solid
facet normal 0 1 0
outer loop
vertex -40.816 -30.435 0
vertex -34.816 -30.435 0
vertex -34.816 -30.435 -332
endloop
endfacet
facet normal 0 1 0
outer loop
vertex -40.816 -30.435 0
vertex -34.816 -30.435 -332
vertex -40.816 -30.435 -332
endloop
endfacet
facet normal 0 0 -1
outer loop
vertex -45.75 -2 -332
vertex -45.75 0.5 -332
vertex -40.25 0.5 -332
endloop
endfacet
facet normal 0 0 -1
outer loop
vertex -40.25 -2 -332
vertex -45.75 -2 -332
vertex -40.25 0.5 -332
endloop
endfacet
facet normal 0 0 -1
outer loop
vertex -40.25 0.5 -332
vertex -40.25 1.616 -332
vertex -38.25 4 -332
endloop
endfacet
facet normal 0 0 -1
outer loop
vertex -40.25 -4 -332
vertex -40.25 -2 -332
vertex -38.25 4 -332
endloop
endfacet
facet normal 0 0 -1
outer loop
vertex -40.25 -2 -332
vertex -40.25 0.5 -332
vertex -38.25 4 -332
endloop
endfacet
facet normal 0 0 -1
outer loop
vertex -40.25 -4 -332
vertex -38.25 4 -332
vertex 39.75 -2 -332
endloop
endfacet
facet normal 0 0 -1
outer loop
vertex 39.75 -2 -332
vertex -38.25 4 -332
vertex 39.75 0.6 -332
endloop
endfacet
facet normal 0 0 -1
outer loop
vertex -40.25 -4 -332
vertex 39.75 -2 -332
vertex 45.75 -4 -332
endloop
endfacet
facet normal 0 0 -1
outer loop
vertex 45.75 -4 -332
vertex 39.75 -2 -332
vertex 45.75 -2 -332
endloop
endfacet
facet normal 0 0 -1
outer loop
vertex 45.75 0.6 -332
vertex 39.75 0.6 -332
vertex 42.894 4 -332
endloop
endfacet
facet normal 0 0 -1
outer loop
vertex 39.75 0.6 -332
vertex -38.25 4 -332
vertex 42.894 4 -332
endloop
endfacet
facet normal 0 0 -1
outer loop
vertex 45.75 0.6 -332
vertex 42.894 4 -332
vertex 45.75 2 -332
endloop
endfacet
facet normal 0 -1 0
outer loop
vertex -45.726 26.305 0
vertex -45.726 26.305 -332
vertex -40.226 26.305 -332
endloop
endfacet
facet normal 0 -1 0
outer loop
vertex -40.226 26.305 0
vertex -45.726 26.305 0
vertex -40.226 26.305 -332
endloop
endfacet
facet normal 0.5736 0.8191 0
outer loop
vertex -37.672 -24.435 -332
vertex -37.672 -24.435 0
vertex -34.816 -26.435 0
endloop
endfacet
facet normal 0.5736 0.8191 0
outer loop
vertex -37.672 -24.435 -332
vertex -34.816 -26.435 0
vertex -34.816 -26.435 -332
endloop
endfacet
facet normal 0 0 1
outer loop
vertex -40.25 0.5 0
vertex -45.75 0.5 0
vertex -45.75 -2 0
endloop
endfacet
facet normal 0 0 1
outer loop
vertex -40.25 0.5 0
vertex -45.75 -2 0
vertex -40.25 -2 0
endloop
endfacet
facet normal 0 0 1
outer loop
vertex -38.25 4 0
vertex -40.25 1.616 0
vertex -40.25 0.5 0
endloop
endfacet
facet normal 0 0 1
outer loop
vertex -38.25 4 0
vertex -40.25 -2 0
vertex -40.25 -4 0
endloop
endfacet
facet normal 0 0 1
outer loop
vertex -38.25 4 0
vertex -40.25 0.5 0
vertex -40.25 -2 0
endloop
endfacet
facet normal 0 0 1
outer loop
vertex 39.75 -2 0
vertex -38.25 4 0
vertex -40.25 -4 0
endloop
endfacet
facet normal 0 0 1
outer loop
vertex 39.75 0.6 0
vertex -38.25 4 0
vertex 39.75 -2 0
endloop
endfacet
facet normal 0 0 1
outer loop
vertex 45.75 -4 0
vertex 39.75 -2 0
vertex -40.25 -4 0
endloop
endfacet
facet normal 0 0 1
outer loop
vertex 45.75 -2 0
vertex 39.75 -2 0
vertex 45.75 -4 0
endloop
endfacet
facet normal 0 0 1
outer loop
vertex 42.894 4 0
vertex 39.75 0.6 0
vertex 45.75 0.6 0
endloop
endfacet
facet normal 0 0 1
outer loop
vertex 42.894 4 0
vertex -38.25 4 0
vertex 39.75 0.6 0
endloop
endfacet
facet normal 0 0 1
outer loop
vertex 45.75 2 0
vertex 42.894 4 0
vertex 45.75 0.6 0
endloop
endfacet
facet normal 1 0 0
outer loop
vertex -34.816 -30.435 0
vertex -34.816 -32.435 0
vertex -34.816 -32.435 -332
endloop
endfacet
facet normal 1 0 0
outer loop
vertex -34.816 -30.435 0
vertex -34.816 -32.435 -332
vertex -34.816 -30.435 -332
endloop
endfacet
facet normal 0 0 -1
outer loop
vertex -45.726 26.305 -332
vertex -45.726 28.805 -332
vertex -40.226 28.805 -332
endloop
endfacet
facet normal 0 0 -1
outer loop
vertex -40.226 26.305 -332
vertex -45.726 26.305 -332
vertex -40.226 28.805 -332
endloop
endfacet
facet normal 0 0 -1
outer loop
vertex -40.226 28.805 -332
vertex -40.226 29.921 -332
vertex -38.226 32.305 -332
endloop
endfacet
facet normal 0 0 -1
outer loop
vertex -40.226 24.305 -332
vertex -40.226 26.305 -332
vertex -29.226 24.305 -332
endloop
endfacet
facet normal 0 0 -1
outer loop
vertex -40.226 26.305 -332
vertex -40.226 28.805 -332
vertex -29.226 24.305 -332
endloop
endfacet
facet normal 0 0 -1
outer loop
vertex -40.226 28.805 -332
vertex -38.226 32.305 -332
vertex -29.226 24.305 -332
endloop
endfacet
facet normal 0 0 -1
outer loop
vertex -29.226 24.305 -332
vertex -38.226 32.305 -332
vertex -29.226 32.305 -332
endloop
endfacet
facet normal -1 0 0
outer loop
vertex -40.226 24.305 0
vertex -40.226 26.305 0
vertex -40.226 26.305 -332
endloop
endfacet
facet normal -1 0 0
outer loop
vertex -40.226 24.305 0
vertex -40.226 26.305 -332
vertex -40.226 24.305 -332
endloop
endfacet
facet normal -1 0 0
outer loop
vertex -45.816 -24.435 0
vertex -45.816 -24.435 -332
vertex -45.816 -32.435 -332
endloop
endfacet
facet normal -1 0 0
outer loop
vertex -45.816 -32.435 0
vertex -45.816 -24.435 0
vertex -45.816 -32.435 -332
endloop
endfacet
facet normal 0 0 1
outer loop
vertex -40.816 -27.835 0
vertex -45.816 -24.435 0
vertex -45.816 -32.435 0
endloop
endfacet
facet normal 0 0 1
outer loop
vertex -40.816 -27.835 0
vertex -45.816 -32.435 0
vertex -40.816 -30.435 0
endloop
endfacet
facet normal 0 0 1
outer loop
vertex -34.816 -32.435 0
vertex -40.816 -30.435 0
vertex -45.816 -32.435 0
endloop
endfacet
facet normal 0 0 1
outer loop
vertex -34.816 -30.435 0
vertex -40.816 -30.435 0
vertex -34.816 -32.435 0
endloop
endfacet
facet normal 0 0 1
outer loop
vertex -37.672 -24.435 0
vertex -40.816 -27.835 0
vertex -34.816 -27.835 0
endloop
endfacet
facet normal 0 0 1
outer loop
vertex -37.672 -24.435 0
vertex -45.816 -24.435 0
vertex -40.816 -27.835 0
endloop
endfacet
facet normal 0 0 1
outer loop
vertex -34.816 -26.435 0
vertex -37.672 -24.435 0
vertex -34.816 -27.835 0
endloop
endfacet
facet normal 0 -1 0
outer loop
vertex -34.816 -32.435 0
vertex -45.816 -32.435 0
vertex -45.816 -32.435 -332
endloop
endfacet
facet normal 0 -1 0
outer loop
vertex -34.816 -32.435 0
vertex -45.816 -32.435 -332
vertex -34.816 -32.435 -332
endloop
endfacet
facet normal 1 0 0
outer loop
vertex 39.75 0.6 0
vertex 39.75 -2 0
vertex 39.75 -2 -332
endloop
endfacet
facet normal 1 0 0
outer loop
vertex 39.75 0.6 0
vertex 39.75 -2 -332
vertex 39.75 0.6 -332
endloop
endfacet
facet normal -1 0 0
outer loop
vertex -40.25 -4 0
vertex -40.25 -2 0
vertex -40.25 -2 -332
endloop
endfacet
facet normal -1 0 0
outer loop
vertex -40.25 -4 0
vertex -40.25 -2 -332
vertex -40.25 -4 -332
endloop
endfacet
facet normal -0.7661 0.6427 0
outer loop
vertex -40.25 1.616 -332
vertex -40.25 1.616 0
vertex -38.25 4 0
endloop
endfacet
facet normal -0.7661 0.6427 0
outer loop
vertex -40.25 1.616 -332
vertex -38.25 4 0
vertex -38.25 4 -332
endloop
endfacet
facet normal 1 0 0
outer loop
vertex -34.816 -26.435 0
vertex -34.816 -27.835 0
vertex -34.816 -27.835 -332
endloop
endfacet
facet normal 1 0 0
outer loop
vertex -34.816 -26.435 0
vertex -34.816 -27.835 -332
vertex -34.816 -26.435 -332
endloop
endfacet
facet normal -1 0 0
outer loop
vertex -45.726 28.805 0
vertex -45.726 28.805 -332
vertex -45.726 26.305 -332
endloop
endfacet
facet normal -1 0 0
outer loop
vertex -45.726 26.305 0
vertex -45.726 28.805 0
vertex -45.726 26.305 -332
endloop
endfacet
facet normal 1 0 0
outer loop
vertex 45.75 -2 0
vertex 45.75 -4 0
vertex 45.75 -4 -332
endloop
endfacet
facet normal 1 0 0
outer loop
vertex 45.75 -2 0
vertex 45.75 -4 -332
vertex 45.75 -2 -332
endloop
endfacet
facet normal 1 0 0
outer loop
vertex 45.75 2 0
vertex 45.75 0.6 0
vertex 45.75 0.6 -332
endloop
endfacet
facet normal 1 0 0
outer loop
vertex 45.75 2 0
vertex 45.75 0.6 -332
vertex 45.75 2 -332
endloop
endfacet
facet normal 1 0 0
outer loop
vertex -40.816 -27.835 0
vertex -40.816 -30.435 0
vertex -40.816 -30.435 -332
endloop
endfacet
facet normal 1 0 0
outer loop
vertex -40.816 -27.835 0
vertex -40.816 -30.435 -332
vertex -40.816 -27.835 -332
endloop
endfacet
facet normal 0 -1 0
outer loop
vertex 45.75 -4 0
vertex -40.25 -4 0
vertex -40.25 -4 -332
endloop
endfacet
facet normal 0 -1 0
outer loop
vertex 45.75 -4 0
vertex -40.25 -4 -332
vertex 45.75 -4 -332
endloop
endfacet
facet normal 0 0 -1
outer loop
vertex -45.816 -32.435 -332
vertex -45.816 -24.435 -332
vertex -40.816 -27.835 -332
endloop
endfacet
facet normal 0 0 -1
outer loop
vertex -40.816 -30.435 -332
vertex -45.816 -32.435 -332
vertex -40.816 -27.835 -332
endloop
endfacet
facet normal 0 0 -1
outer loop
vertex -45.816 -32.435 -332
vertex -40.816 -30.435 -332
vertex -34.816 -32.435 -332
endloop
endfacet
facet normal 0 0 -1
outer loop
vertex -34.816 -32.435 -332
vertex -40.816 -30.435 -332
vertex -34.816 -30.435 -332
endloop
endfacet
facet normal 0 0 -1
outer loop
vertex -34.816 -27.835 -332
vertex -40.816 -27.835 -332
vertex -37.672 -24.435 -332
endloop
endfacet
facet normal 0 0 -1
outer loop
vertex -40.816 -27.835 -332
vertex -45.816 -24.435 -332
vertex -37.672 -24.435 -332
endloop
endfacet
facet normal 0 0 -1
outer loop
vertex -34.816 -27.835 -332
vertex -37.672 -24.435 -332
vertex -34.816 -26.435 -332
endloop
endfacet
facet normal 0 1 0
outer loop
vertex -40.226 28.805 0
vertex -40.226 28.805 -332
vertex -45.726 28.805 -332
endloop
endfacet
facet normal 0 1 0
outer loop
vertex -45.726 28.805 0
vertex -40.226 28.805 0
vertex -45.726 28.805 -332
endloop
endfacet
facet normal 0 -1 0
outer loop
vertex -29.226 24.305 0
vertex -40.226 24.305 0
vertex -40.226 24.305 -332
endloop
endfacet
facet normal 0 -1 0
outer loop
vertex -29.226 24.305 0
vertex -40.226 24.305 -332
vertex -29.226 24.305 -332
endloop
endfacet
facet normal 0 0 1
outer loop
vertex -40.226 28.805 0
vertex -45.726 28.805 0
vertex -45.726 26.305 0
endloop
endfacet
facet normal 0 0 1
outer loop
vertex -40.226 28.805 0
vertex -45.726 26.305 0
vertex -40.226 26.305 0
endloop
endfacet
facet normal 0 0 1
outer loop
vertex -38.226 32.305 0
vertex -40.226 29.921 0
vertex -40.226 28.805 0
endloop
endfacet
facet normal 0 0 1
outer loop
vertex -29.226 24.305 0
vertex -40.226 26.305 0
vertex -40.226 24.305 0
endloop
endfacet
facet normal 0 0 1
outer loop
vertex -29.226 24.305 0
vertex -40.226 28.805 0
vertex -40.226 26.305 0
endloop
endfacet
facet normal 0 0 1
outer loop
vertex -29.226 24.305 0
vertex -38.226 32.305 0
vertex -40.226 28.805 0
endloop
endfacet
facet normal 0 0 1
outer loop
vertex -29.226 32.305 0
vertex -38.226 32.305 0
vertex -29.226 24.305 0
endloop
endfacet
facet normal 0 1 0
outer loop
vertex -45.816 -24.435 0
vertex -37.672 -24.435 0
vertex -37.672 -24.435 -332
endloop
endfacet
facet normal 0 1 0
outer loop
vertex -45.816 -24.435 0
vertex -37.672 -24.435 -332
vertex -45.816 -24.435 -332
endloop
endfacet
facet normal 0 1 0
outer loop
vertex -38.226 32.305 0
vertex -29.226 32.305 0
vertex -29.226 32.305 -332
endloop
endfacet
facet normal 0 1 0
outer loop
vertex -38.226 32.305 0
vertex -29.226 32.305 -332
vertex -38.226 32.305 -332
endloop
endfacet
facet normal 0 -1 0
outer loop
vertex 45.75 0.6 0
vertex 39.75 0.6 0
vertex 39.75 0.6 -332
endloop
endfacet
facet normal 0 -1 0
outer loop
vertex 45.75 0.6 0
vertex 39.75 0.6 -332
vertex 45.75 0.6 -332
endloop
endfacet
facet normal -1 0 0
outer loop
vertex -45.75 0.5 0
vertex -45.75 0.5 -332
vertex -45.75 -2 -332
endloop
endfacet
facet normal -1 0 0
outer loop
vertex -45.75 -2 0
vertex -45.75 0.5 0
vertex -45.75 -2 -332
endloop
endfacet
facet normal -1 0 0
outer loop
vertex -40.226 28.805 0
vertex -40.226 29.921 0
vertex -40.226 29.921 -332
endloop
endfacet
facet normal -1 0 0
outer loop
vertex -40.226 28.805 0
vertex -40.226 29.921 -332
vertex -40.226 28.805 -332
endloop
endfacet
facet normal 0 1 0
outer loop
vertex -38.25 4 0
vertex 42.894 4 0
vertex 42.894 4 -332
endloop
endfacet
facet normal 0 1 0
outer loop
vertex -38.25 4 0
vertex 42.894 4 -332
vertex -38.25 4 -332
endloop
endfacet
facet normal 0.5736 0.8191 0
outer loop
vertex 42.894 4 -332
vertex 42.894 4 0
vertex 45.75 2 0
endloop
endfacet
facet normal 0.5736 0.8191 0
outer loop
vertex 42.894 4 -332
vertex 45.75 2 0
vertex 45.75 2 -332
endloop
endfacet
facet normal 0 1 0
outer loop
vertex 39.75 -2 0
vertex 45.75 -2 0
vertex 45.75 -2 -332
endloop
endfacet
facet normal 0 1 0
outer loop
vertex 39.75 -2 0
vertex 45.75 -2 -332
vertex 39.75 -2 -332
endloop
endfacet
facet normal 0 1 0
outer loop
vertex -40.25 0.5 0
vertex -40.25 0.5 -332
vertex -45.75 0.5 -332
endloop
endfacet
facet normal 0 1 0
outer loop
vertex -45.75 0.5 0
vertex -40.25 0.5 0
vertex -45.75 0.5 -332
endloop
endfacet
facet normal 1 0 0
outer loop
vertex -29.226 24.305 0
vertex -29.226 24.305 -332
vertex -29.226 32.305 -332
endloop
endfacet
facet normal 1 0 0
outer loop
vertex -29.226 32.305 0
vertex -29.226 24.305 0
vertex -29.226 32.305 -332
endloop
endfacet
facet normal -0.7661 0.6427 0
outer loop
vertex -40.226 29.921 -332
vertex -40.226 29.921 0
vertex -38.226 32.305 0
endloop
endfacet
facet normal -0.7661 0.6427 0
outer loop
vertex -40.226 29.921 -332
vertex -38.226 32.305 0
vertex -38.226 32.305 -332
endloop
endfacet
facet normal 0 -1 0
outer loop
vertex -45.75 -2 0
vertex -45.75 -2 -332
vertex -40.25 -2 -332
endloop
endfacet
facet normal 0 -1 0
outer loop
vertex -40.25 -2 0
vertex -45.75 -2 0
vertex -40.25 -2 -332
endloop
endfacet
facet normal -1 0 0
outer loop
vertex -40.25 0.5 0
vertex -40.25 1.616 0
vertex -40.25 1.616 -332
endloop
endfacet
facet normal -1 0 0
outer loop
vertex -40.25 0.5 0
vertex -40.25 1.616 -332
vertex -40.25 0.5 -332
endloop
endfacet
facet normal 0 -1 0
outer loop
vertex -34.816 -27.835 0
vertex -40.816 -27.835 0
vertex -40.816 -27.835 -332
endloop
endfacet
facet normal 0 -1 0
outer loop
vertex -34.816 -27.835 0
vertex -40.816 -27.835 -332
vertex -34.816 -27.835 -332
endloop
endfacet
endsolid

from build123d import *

# Parameters (mm, degrees)
F1_DEPTH = 332
F2_SIZE2 = 2.3835071852
F2_SIZE  = 2
F3_SIZE2 = 2.8562960135
F3_SIZE  = 2
F4_DEPTH = 332
F5_DEPTH = 332
F6_SIZE2 = 2.3835071852
F6_SIZE  = 2
F7_SIZE2 = 2.8562960135
F7_SIZE  = 2


with BuildPart() as f1:
    # F0 (on Top) → F1 (new body)
    with BuildSketch(Plane.XY):
        Polygon((45.75, 0.6), (45.75, 4), (-40.25, 4), (-40.25, 0.5), (-45.75, 0.5), (-45.75, -2), (-40.25, -2), (-40.25, -4), (45.75, -4), (45.75, -2), (39.75, -2), (39.75, 0.6), align=None)
    extrude(amount=-F1_DEPTH)

    # F2
    f2_edges = [f1.edges().sort_by_distance(p)[0] for p in [
        (-40.25, 4, -166),
    ]]
    f2_side = f1.faces().sort_by_distance((2.75, 4, -166))[0]
    chamfer(f2_edges, length=F2_SIZE, length2=F2_SIZE2, reference=f2_side)

    # F3
    f3_edges = [f1.edges().sort_by_distance(p)[0] for p in [
        (45.75, 4, -166),
    ]]
    f3_side = f1.faces().sort_by_distance((45.75, 2.3, -166))[0]
    chamfer(f3_edges, length=F3_SIZE, length2=F3_SIZE2, reference=f3_side)


with BuildPart() as f4:
    # F0 (on Top) → F4 (new body)
    with BuildSketch(Plane.XY):
        Polygon((-29.2261481244, 28.9047427452), (-29.2261481244, 32.3047427452), (-40.2261481244, 32.3047427452), (-40.2261481244, 28.8047427452), (-45.7261481244, 28.8047427452), (-45.7261481244, 26.3047427452), (-40.2261481244, 26.3047427452), (-40.2261481244, 24.3047427452), (-29.2261481244, 24.3047427452), (-29.2261481244, 26.3047427452), align=None)
    extrude(amount=-F4_DEPTH)

    # F6
    f6_edges = [f4.edges().sort_by_distance(p)[0] for p in [
        (-40.226148, 32.304743, -166),
    ]]
    f6_side = f4.faces().sort_by_distance((-34.726148, 32.304743, -166))[0]
    chamfer(f6_edges, length=F6_SIZE, length2=F6_SIZE2, reference=f6_side)


with BuildPart() as f5:
    # F0 (on Top) → F5 (new body)
    with BuildSketch(Plane.XY):
        Polygon((-34.8161143508, -27.8352580988), (-34.8161143508, -24.4352580988), (-40.3161143508, -24.4352580988), (-45.8161143508, -24.4352580988), (-45.8161143508, -30.4352580988), (-45.8161143508, -32.4352580988), (-40.3161143508, -32.4352580988), (-34.8161143508, -32.4352580988), (-34.8161143508, -30.4352580988), (-40.8161143508, -30.4352580988), (-40.8161143508, -27.8352580988), align=None)
    extrude(amount=-F5_DEPTH)

    # F7
    f7_edges = [f5.edges().sort_by_distance(p)[0] for p in [
        (-34.816114, -24.435258, -166),
    ]]
    f7_side = f5.faces().sort_by_distance((-34.816114, -26.135258, -166))[0]
    chamfer(f7_edges, length=F7_SIZE, length2=F7_SIZE2, reference=f7_side)


solid = Compound([f1.part, f4.part, f5.part])
